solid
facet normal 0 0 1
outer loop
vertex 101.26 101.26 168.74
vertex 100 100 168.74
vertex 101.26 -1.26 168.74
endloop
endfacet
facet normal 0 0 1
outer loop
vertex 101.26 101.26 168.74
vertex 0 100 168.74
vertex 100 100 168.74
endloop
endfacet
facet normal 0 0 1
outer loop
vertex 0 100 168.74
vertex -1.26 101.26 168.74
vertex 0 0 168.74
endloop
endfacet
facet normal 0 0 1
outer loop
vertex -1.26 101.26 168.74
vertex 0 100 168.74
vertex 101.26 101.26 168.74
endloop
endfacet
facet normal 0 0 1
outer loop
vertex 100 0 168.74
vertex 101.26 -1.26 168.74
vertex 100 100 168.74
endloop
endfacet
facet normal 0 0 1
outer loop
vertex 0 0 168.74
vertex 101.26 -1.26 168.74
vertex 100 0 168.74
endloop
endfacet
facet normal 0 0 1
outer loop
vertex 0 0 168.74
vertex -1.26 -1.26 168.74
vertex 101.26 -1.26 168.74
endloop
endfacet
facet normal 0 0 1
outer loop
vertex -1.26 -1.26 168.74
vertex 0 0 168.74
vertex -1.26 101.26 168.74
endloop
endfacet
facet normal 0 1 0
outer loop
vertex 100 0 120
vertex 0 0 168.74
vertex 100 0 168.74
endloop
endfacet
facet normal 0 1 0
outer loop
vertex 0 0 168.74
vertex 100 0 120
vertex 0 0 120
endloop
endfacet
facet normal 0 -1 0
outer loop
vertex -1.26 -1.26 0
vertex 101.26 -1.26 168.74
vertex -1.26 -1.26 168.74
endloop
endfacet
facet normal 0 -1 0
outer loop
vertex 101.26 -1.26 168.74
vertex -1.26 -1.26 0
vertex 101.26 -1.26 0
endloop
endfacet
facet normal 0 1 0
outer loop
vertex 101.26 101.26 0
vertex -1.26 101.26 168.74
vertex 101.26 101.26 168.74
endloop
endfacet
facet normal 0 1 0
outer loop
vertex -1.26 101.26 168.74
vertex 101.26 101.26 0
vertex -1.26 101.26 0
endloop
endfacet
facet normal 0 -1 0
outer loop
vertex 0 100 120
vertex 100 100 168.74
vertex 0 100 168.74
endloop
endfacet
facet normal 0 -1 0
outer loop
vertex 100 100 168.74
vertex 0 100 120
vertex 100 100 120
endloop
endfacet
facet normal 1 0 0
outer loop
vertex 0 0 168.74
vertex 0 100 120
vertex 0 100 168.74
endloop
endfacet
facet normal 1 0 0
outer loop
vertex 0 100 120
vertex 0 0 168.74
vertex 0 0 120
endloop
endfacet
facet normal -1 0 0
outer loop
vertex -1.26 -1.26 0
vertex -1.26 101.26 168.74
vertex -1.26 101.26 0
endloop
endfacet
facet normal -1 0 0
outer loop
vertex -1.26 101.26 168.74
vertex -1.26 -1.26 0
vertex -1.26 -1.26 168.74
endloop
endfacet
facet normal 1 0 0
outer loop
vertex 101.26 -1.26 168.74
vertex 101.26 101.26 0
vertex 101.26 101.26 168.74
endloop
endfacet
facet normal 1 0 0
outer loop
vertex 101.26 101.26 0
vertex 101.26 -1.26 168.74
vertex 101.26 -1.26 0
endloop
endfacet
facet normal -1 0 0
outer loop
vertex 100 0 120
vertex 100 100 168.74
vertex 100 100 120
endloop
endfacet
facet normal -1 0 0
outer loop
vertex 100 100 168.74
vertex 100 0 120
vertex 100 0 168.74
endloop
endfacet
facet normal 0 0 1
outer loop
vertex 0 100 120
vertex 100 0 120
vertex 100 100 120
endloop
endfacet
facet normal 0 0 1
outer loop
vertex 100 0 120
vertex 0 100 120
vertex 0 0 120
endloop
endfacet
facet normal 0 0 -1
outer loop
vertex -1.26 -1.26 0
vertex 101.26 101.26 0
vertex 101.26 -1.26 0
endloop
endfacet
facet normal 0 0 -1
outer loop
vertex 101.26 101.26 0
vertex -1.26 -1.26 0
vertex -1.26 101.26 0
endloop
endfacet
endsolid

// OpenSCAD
//Fussbreite
fb=100;
//Fusstiefe
ft=100;
//Fusserhöhung (Schinken)
fh=120;
//Thickness Wände
t=1.26; //3 lines => Dicker als Kreditkarte!
//Höhe Etagenplatten
h=1.2;

///DAS UNTERE MUSS EIN MASSIVER BLOCK WERDEN
//INFILL DANN IM SLICER SETZEN

//oben
//color("#444444")
//translate([-t,-t,fh-h])
//cube([fb+t*2,ft+t*2,h]);

//unten
//color("#444444")
//translate([-t,-t,0])
//cube([fb+t*2,ft+t*2,h]);

module cube_ohne_deckel(ch)
{
//vorne
translate([0,-t,0])
cube([fb,t,ch]);

//hinten
translate([0,ft,0])
cube([fb,t,ch]);

//links
translate([-t,0,0])
cube([t,ft,ch]);

//rechts
translate([fb,0,0])
cube([t,ft,ch]);

//links vorne
color("#FF0000")
translate([-t,-t,0])
cube([t,t,ch]);

//rechts vorne
color("#FF0000")
translate([fb,-t,0])
cube([t,t,ch]);

//rechts hinten
color("#FF0000")
translate([fb,ft,0])
cube([t,t,ch]);

//links hinten
color("#FF0000")
translate([-t,ft,0])
cube([t,t,ch]);
}

//cube_ohne_deckel(fh);
translate([-t,-t,0])
cube([fb+t*2,ft+t*2,fh]);

translate([0,0,fh-t])
cube_ohne_deckel(50);
